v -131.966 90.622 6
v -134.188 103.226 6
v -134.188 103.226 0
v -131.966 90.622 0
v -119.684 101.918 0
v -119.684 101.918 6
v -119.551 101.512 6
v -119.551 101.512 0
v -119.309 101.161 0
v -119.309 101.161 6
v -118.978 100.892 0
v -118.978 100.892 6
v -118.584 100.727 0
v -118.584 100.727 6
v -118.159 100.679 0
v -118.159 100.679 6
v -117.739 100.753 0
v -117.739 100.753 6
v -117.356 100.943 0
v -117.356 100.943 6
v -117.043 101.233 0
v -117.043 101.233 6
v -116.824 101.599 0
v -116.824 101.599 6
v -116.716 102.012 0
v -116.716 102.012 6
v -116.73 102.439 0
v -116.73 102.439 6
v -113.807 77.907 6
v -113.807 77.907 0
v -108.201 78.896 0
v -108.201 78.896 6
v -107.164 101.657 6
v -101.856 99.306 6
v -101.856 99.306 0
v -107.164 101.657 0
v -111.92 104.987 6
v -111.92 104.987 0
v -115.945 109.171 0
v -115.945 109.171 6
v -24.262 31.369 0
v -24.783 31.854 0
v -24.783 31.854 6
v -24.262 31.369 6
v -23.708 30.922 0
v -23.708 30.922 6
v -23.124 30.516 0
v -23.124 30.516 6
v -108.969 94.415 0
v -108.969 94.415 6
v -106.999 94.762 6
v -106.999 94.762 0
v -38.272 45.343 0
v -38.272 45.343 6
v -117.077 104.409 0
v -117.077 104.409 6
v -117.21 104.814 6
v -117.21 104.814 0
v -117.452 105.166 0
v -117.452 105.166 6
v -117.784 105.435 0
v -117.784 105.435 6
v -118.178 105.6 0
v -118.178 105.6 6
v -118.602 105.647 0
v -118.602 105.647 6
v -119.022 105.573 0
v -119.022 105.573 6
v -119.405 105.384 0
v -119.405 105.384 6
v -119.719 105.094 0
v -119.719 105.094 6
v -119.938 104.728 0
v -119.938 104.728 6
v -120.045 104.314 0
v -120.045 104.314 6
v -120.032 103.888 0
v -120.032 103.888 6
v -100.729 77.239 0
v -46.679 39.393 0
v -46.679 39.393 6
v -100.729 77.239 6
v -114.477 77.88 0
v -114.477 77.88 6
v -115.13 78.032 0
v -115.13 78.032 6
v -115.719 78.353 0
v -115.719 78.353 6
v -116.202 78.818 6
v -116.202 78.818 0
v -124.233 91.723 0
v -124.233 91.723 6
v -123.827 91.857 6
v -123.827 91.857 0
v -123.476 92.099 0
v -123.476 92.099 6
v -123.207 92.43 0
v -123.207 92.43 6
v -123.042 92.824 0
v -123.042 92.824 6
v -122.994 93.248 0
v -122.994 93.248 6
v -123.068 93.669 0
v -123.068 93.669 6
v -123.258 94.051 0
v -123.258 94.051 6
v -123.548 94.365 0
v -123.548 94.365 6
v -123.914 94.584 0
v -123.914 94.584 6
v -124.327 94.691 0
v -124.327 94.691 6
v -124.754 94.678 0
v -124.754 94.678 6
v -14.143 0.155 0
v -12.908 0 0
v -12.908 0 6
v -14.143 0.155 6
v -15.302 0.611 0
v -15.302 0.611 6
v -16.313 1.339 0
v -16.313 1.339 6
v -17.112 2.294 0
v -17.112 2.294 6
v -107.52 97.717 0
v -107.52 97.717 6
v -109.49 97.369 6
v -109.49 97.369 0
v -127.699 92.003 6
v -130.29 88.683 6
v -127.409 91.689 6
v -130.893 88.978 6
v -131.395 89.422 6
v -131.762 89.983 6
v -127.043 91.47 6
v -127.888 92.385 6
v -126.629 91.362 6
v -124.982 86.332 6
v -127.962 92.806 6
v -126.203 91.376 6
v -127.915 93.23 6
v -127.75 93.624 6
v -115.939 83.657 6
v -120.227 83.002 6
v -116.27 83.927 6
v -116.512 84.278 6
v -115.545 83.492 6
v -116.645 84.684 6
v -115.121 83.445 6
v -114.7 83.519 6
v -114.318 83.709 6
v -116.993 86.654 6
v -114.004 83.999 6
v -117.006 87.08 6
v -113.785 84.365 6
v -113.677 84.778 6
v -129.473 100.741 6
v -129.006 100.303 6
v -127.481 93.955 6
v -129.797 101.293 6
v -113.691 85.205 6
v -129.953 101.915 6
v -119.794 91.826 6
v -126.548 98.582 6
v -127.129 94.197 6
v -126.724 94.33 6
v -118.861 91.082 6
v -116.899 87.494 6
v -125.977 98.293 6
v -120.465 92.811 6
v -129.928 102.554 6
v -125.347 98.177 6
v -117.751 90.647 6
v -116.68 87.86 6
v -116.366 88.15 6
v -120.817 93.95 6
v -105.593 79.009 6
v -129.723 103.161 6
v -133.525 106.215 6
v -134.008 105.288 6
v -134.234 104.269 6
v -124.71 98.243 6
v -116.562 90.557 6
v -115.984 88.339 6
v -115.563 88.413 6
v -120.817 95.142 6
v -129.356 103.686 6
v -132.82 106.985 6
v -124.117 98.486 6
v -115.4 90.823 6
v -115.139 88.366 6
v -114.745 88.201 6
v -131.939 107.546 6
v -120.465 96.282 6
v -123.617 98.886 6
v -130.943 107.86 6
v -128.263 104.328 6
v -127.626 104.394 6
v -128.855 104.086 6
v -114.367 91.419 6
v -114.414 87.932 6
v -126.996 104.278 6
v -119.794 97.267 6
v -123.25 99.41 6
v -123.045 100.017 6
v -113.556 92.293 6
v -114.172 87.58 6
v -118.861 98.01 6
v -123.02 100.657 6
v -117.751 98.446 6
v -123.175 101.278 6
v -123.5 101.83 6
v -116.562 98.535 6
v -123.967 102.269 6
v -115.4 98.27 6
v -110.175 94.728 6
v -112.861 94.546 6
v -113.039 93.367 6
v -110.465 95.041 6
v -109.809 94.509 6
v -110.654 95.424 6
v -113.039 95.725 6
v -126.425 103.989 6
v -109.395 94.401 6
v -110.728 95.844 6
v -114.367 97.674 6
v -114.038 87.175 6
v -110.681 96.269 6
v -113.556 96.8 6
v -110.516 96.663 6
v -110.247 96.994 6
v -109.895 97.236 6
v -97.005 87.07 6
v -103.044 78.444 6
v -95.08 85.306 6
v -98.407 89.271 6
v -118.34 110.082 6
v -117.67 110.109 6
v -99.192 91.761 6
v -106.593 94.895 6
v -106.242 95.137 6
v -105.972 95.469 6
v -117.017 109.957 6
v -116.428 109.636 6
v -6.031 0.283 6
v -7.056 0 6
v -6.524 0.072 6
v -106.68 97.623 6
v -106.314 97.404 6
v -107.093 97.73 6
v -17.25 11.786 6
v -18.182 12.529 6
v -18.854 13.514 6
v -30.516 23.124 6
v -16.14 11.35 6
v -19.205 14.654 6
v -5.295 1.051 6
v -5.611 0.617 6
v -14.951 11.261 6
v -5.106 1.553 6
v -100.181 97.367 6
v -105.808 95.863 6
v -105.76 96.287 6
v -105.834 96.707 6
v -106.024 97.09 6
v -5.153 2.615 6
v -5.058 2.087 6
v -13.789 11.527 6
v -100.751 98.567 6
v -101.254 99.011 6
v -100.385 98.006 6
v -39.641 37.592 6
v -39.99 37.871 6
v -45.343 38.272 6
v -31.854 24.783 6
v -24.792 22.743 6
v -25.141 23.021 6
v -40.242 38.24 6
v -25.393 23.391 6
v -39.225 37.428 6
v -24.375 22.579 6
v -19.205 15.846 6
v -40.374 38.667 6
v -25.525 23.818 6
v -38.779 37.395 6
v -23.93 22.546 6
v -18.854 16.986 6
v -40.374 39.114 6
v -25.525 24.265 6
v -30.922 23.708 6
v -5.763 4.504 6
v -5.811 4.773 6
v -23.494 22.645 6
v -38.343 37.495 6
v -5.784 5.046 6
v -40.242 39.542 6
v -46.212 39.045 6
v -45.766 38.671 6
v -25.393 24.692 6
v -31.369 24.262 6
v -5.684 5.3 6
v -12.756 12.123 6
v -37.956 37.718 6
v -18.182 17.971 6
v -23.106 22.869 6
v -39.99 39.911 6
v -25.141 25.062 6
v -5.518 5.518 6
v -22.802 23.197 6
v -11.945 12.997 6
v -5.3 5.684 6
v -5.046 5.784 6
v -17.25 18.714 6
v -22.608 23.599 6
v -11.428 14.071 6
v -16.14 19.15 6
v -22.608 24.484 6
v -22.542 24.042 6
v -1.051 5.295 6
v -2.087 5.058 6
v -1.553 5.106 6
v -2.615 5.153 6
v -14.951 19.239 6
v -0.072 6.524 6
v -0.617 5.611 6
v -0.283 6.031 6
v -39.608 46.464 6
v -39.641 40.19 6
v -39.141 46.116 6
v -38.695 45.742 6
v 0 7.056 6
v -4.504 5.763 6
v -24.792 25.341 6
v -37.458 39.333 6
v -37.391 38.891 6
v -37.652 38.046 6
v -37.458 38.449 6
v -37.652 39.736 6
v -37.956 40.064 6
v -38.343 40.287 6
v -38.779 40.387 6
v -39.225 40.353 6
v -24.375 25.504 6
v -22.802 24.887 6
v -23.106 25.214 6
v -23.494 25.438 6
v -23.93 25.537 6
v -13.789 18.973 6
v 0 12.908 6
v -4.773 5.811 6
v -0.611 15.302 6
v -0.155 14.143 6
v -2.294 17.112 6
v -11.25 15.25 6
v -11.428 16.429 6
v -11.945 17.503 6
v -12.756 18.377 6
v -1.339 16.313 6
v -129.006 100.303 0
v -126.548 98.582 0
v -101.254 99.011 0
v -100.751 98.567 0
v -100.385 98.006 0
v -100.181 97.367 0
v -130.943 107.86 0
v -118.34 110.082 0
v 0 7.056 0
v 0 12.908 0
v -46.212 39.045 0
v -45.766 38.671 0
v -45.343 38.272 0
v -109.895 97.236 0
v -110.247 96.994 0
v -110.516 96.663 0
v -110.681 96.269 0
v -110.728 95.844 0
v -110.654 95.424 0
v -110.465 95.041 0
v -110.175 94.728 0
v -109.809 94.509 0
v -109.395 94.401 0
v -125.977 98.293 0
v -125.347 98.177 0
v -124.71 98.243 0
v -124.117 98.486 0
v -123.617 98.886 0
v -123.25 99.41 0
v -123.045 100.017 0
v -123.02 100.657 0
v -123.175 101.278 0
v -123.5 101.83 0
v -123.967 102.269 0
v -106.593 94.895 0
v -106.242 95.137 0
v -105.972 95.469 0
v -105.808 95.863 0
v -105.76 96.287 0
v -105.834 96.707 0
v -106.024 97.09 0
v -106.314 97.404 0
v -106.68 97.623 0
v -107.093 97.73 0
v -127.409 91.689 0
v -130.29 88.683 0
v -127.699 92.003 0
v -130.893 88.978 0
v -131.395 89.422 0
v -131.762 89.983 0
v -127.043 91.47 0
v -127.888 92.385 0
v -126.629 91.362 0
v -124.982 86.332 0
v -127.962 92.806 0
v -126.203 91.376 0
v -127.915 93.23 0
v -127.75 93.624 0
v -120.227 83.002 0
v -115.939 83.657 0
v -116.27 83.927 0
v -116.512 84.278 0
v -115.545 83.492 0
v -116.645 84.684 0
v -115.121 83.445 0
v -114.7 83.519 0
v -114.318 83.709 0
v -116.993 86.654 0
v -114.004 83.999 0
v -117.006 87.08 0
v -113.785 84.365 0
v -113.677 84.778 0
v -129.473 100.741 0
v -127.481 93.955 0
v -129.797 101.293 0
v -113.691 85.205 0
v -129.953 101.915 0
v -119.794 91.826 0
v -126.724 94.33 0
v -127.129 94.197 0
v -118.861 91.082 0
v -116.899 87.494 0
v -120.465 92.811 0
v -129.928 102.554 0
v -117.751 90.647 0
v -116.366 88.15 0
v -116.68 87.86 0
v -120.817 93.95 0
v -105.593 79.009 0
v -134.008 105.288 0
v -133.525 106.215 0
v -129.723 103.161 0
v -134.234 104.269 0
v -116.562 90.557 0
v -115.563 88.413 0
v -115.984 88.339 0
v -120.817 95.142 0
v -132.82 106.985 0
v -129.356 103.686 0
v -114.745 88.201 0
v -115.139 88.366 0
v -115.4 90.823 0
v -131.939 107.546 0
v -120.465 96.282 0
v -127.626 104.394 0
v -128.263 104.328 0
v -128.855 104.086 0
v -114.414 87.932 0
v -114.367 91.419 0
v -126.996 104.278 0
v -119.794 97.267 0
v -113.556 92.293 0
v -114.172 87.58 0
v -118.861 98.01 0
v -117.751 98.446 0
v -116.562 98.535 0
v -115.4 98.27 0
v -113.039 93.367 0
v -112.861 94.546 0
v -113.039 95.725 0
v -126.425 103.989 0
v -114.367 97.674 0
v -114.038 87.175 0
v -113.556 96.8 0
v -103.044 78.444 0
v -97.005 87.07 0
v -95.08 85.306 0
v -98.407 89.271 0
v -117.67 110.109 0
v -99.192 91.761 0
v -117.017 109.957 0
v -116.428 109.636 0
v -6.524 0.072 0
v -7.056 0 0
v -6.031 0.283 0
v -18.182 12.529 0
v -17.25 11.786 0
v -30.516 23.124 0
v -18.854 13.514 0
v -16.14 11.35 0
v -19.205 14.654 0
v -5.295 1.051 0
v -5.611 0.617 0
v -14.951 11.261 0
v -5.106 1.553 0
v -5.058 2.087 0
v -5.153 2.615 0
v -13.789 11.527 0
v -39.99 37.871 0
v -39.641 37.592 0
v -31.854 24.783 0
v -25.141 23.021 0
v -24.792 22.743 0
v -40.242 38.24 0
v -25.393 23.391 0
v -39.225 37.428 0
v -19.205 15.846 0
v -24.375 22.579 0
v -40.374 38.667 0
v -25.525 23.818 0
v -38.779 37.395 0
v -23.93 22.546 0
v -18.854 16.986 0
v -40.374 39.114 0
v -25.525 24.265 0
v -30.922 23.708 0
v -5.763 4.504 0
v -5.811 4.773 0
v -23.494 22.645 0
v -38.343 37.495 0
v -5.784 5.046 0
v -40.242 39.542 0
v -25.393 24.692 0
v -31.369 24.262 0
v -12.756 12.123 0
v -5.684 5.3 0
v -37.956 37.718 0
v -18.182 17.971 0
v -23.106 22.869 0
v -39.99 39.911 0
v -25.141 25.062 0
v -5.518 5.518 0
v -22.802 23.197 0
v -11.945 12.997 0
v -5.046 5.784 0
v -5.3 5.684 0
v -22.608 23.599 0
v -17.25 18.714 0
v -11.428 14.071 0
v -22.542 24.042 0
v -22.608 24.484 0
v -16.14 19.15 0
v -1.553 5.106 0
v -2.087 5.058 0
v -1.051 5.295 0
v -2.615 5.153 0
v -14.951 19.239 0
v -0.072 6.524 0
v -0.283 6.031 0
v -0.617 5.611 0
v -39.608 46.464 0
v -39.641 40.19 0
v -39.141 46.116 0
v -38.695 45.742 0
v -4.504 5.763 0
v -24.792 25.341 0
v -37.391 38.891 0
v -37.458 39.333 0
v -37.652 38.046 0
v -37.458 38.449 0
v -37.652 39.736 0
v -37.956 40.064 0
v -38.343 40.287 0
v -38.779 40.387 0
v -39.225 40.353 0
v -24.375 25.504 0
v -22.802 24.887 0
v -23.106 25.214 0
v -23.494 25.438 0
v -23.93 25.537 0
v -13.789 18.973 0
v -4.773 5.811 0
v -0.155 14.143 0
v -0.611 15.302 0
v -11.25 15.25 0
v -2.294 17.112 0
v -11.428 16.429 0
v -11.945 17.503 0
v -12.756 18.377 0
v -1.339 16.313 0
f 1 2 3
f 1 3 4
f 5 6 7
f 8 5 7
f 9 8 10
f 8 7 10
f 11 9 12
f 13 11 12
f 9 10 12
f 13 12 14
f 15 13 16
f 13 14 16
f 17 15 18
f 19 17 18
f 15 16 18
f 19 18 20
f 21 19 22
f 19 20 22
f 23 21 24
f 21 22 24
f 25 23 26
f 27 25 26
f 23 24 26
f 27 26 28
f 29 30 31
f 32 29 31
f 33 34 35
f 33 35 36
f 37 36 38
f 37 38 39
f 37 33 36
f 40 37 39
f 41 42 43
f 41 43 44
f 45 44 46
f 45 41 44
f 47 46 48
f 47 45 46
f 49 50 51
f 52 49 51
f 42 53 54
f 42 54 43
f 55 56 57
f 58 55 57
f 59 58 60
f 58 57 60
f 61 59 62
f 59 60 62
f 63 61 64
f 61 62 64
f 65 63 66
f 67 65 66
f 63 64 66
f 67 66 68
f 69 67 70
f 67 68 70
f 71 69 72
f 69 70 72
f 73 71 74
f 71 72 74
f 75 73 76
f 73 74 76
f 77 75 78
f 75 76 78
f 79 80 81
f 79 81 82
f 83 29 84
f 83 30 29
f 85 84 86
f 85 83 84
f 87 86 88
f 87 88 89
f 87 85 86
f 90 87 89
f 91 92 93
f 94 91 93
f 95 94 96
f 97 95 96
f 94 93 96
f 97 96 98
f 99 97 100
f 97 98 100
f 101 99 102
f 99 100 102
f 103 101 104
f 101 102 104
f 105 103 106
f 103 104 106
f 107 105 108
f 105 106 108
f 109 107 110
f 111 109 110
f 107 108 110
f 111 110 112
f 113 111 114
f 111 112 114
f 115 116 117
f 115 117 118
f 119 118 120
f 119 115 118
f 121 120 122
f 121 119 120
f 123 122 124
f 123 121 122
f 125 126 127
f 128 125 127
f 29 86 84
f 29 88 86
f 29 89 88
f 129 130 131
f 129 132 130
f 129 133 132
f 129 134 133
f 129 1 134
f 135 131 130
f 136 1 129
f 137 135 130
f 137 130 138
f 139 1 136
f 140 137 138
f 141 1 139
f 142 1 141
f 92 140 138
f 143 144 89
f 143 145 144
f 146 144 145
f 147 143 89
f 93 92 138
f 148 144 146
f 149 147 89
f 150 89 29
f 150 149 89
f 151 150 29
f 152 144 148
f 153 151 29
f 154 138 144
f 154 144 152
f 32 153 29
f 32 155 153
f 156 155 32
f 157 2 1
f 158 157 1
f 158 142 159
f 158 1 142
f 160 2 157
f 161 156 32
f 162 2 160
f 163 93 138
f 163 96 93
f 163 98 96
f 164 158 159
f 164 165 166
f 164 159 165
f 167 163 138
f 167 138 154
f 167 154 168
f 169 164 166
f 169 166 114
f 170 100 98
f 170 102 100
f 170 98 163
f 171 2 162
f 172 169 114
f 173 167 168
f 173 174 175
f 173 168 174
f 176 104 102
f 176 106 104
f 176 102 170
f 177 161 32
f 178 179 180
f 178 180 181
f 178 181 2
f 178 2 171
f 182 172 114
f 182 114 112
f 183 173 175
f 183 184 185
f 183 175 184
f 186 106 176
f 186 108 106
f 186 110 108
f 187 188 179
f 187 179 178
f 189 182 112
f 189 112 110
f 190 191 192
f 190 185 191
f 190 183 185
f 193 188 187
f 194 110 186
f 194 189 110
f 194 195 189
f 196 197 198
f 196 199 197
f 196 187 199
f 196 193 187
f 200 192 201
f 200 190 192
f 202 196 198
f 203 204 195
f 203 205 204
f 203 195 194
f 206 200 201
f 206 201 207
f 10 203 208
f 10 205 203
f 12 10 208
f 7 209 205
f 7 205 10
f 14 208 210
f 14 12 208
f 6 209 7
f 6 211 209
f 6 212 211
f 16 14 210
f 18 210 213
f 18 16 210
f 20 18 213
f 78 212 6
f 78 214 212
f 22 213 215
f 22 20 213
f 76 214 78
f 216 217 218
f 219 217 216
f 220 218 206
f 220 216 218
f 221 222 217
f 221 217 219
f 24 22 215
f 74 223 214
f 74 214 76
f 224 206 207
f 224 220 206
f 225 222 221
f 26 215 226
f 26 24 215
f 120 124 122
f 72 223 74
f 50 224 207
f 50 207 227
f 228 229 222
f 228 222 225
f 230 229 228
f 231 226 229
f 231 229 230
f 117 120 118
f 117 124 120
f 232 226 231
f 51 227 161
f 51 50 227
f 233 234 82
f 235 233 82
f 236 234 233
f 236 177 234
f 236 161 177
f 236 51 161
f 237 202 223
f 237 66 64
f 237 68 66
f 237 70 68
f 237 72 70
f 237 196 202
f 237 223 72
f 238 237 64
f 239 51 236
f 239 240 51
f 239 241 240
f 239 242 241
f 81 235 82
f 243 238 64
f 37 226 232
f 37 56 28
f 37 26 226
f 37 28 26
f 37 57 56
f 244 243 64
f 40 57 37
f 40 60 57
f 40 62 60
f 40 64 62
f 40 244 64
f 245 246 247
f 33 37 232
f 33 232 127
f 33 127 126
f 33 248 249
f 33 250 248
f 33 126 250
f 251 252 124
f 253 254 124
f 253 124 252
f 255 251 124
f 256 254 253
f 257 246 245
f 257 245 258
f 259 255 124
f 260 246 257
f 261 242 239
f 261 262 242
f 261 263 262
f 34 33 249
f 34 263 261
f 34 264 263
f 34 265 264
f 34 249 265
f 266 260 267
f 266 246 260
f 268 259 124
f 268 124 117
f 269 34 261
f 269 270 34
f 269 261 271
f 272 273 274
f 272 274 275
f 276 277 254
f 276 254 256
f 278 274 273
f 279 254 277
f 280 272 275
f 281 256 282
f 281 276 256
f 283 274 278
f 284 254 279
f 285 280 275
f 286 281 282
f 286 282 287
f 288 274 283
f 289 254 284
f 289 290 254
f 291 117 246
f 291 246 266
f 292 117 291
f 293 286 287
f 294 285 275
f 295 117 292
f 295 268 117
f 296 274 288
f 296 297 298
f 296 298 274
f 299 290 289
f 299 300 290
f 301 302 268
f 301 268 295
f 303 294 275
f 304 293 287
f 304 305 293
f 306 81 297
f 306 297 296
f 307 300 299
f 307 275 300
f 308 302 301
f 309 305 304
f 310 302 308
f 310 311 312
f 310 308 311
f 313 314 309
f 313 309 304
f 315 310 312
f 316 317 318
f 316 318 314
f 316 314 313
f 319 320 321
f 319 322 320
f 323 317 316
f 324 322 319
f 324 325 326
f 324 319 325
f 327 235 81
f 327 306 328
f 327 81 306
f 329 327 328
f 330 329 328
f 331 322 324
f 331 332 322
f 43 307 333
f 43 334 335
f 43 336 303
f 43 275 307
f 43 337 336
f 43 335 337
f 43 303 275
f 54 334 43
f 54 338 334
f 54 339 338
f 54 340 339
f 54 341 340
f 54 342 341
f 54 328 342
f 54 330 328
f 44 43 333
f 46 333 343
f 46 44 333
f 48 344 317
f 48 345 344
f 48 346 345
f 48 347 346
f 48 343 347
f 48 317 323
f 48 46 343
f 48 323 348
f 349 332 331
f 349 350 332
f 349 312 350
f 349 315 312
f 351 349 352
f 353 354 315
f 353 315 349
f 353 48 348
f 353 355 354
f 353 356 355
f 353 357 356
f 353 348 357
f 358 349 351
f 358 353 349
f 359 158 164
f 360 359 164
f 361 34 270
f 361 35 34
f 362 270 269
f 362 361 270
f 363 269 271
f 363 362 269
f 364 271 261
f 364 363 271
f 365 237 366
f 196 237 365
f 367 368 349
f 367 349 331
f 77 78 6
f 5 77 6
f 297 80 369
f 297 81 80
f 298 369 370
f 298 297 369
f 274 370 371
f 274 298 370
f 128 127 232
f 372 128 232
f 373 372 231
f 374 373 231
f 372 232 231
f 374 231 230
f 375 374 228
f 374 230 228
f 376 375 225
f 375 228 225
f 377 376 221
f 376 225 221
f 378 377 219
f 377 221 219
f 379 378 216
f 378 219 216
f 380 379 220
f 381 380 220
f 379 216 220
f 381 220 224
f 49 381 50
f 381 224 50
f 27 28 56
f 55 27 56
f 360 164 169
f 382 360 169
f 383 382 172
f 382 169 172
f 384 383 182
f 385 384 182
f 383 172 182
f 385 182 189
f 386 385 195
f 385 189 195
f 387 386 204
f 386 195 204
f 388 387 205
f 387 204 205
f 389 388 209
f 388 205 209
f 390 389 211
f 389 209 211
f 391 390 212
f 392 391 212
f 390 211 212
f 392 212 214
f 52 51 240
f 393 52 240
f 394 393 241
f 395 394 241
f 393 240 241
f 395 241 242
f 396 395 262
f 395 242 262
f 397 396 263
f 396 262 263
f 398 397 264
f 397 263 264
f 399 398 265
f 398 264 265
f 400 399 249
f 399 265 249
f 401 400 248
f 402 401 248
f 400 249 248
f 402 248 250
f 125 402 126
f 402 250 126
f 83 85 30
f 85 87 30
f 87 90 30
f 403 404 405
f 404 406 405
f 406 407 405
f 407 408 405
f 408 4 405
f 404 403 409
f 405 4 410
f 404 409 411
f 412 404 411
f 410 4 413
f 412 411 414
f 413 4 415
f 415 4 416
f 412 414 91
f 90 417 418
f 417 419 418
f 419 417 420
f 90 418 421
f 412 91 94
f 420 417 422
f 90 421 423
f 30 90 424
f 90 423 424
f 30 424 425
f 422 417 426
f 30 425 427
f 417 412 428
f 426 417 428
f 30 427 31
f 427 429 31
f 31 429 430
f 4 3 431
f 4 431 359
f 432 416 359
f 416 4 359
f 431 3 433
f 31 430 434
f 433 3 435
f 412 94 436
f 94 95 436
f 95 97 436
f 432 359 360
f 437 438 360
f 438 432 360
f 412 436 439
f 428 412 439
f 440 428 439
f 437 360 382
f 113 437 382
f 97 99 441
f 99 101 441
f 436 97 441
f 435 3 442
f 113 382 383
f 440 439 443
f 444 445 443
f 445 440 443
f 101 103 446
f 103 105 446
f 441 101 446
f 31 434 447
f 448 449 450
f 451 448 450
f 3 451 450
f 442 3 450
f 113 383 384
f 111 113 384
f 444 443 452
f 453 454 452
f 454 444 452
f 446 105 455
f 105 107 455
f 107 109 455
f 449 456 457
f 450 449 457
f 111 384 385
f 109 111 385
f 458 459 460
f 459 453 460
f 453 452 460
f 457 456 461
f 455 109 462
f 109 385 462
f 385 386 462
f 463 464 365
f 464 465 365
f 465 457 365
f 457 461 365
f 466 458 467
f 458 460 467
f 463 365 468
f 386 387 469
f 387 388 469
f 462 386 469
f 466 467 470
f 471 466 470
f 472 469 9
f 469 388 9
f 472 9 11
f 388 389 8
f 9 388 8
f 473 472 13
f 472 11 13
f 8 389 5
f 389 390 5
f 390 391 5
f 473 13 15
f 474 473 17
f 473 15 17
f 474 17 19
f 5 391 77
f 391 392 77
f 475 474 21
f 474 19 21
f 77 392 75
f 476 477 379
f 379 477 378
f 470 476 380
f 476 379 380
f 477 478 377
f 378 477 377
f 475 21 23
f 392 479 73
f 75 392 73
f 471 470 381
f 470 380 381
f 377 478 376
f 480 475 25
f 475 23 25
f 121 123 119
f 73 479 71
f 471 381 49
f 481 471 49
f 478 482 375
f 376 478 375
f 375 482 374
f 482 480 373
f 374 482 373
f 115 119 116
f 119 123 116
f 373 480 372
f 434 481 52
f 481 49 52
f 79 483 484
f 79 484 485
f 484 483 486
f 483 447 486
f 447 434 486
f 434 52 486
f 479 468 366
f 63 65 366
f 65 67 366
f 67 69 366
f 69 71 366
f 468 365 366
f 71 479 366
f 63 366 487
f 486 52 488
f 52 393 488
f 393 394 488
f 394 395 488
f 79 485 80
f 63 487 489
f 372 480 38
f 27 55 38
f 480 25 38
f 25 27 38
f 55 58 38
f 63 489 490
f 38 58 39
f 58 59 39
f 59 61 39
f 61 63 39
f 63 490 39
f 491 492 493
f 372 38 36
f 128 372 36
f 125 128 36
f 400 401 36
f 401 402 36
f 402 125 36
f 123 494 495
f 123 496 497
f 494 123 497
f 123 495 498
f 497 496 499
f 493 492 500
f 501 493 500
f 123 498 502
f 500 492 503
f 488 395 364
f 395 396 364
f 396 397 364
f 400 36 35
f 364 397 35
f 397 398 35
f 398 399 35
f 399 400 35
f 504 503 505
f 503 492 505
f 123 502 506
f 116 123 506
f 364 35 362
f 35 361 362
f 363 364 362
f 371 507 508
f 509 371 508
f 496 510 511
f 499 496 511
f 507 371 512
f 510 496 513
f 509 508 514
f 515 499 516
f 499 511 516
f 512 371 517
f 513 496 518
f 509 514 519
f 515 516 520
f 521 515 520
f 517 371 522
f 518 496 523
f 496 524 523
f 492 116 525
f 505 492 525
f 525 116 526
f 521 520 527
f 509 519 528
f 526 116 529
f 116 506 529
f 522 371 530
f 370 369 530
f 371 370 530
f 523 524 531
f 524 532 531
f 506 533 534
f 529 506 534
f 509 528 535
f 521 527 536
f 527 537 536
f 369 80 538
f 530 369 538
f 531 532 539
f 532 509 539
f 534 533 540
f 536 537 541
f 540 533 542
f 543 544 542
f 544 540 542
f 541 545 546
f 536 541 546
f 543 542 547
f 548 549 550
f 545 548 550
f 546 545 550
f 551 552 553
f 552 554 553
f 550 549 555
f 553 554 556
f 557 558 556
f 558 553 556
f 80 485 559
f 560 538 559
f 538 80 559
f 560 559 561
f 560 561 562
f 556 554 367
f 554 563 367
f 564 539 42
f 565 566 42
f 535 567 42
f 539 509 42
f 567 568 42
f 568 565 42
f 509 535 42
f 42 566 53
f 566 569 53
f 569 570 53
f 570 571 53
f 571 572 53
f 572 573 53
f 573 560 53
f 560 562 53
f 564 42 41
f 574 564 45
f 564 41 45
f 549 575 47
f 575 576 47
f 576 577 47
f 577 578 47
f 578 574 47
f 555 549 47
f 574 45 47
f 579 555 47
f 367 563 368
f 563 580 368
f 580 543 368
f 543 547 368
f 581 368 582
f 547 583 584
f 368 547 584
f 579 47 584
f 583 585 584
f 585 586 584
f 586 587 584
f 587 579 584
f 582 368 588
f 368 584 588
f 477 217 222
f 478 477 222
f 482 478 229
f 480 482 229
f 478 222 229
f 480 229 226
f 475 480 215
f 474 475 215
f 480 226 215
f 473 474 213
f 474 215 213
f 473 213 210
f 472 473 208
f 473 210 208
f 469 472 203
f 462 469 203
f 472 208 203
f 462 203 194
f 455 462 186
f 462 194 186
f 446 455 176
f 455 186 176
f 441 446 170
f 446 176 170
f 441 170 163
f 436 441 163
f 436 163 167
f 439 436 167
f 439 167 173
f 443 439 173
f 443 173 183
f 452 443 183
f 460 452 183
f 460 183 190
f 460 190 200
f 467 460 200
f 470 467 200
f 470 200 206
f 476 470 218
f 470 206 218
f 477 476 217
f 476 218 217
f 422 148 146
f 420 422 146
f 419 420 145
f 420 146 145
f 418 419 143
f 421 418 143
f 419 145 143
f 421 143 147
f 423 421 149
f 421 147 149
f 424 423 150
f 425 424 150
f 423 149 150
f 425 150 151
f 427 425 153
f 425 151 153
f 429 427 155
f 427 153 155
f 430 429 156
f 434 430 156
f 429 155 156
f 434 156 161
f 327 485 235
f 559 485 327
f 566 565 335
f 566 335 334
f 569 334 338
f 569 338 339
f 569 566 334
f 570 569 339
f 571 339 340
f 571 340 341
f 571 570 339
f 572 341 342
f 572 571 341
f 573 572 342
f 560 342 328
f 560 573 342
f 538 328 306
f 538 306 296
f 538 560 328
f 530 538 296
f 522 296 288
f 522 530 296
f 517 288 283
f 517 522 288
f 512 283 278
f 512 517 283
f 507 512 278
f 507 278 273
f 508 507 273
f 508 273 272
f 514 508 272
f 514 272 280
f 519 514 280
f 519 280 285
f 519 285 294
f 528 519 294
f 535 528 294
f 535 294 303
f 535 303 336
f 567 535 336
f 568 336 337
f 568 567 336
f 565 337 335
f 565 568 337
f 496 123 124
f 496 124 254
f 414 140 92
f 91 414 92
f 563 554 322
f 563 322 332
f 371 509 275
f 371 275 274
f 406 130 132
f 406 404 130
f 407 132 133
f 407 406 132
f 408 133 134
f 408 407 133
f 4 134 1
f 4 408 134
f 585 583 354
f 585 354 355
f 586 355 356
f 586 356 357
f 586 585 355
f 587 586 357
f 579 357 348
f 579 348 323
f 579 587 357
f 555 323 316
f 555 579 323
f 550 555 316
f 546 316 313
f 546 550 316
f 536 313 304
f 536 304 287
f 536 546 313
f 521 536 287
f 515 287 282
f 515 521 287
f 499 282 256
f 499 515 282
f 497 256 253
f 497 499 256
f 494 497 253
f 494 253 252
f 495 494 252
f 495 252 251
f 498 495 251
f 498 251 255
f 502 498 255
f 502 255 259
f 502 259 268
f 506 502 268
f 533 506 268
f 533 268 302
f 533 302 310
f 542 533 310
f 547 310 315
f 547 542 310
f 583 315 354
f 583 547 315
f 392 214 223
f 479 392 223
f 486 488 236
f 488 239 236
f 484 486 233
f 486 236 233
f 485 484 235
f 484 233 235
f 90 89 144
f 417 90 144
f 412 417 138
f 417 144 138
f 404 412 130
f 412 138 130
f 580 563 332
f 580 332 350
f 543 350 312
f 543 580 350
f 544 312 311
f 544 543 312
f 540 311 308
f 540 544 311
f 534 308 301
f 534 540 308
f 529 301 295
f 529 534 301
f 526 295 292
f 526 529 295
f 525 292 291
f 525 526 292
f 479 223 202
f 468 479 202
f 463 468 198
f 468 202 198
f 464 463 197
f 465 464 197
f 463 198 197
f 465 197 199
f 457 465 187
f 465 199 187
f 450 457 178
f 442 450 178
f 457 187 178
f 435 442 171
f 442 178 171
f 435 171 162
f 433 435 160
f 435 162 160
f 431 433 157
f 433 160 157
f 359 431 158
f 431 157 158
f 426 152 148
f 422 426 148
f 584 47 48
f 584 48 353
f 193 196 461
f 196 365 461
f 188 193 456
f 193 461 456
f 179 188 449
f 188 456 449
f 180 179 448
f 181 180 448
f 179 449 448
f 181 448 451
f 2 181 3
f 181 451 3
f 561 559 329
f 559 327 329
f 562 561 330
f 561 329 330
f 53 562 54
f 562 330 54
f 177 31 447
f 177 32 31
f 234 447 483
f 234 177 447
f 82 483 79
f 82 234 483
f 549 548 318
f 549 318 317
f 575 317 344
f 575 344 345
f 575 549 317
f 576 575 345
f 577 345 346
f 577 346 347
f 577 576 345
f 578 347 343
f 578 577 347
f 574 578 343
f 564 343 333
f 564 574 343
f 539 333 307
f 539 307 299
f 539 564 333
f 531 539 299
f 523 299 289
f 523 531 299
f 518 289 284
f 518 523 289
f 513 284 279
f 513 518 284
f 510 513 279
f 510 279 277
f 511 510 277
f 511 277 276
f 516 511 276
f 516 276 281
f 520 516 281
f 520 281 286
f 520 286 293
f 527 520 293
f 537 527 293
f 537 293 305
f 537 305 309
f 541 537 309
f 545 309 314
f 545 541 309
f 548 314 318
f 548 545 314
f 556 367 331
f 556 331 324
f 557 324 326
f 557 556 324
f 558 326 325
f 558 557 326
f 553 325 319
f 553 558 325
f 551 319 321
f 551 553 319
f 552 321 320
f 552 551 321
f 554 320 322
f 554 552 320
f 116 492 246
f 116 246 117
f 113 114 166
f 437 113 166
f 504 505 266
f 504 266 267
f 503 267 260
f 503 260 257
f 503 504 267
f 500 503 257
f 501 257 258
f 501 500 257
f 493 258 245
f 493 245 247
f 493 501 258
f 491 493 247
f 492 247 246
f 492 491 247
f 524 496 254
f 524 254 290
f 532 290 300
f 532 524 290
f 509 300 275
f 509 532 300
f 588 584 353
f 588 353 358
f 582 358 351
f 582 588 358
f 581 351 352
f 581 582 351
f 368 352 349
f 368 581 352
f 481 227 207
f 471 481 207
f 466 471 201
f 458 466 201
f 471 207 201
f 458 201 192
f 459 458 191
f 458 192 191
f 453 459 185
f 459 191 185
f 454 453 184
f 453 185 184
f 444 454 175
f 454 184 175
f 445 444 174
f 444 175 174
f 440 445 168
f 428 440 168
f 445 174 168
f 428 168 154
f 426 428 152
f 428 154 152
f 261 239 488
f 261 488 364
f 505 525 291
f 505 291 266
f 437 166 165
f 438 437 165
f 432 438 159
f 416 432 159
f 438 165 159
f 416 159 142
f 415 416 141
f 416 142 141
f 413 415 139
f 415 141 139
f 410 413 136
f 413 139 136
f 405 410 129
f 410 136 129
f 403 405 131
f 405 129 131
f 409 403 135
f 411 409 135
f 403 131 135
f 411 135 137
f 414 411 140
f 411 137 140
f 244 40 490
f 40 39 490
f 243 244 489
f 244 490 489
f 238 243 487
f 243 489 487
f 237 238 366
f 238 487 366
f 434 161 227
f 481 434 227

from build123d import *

# Parameters (mm, degrees)
CROQUIS1_R              = 1.5
CROQUIS1_R_2            = 4
SALIENTE_EXTRUIR1_DEPTH = 6
CROQUIS4_R              = 4
SALIENTE_EXTRUIR3_DEPTH = 6
CORTAR_EXTRUIR1_DEPTH   = 6
REDONDEO3_R             = 4
CORTAR_EXTRUIR2_DEPTH   = 6
REDONDEO4_R             = 2.5
REDONDEO6_R             = 10


with BuildPart() as part:
    # Croquis1 → Saliente-Extruir1 (new body)
    with BuildSketch(Plane.XY):
        with BuildLine():
            Line((-17.112213819, 2.294275414), (-30.516043414, 23.123582692))
            ThreePointArc((-30.516043414, 23.123582692), (-31.14080226, 23.989156666), (-31.854269143, 24.783201331))
            Line((-31.854269143, 24.783201331), (-45.961940777, 38.890872965))
            Line((-45.961940777, 38.890872965), (-104.121735922, 79.614799946))
            Line((-104.121735922, 79.614799946), (-98.473110707, 87.681872787))
            Line((-98.473110707, 87.681872787), (-38.890872965, 45.961940777))
            Line((-38.890872965, 45.961940777), (-24.783201331, 31.854269143))
            ThreePointArc((-24.783201331, 31.854269143), (-23.989156666, 31.14080226), (-23.123582692, 30.516043414))
            Line((-23.123582692, 30.516043414), (-2.294275414, 17.112213819))
            ThreePointArc((-2.294275414, 17.112213819), (-0.610887166, 15.302496804), (0, 12.907567049))
            Line((0, 12.907567049), (0, 7.055686841))
            ThreePointArc((0, 7.055686841), (-0.823113423, 5.438609853), (-2.614937985, 5.15257064))
            Line((-2.614937985, 5.15257064), (-4.503911831, 5.762938925))
            ThreePointArc((-4.503911831, 5.762938925), (-5.518487605, 5.518487605), (-5.762938925, 4.503911831))
            Line((-5.762938925, 4.503911831), (-5.15257064, 2.614937985))
            ThreePointArc((-5.15257064, 2.614937985), (-5.438609853, 0.823113423), (-7.055686841, 0))
            Line((-7.055686841, 0), (-12.907567049, 0))
            ThreePointArc((-12.907567049, 0), (-15.302496804, 0.610887166), (-17.112213819, 2.294275414))
        make_face()
        with Locations((-38.890872965, 38.890872965)):
            Circle(CROQUIS1_R, mode=Mode.SUBTRACT)
        with Locations((-24.04163056, 24.04163056)):
            Circle(CROQUIS1_R, mode=Mode.SUBTRACT)
        with Locations((-15.25, 15.25)):
            Circle(CROQUIS1_R_2, mode=Mode.SUBTRACT)
    extrude(amount=SALIENTE_EXTRUIR1_DEPTH)

    # Croquis4 → Saliente-Extruir3 (add)
    with BuildSketch(Plane.XY.offset(6)):
        Polygon((-98.473110707, 87.681872787), (-100.447042684, 98.87659732), (-116.83008357, 110.348126047), (-134.88265713, 107.164970257), (-131.69950134, 89.112396696), (-115.316460454, 77.640867969), (-104.121735922, 79.614799946), align=None)
        with Locations((-116.861312156, 94.546288657)):
            Circle(CROQUIS4_R, mode=Mode.SUBTRACT)
    extrude(amount=-SALIENTE_EXTRUIR3_DEPTH)

    # Croquis5 → Cortar-Extruir1 (cut)
    with BuildSketch(Plane.XY.offset(6)):
        with BuildLine():
            Line((-129.005623724, 100.303084339), (-126.548167592, 98.58235503))
            ThreePointArc((-126.548167592, 98.58235503), (-123.41452851, 99.134900148), (-123.967073628, 102.26853923))
            Line((-123.967073628, 102.26853923), (-126.424529761, 103.989268539))
            ThreePointArc((-126.424529761, 103.989268539), (-129.558168842, 103.436723421), (-129.005623724, 100.303084339))
        make_face()
        with BuildLine():
            Line((-116.992750408, 86.653556305), (-116.645454053, 84.683940799))
            ThreePointArc((-116.645454053, 84.683940799), (-114.907770157, 83.467201436), (-113.691030794, 85.204885332))
            Line((-113.691030794, 85.204885332), (-114.038327149, 87.174500838))
            ThreePointArc((-114.038327149, 87.174500838), (-115.776011045, 88.391240201), (-116.992750408, 86.653556305))
        make_face()
        with BuildLine():
            Line((-108.968579803, 94.414850405), (-106.998964297, 94.76214676))
            ThreePointArc((-106.998964297, 94.76214676), (-105.782224934, 96.499830656), (-107.51990883, 97.716570019))
            Line((-107.51990883, 97.716570019), (-109.489524336, 97.369273664))
            ThreePointArc((-109.489524336, 97.369273664), (-110.706263699, 95.631589768), (-108.968579803, 94.414850405))
        make_face()
        with BuildLine():
            Line((-124.754044508, 94.67772691), (-126.723660014, 94.330430555))
            ThreePointArc((-126.723660014, 94.330430555), (-127.940399377, 92.592746659), (-126.202715481, 91.376007296))
            Line((-126.202715481, 91.376007296), (-124.233099975, 91.723303651))
            ThreePointArc((-124.233099975, 91.723303651), (-123.016360612, 93.460987547), (-124.754044508, 94.67772691))
        make_face()
        with BuildLine():
            Line((-116.729873903, 102.43902101), (-117.077170259, 104.408636516))
            ThreePointArc((-117.077170259, 104.408636516), (-118.814854155, 105.625375879), (-120.031593518, 103.887691983))
            Line((-120.031593518, 103.887691983), (-119.684297162, 101.918076477))
            ThreePointArc((-119.684297162, 101.918076477), (-117.946613266, 100.701337114), (-116.729873903, 102.43902101))
        make_face()
    extrude(amount=-CORTAR_EXTRUIR1_DEPTH, mode=Mode.SUBTRACT)

    # Redondeo3
    redondeo3_edges = [part.edges().sort_by_distance(p)[0] for p in [
        (-134.88265713, 107.164970257, 3),
    ]]
    fillet(redondeo3_edges, radius=REDONDEO3_R)

    # Croquis7 → Cortar-Extruir2 (cut)
    with BuildSketch(Plane.XY.offset(6)):
        with BuildLine():
            Line((-131.69950134, 89.112396696), (-115.316460454, 77.640867969))
            ThreePointArc((-115.316460454, 77.640867969), (-122.523879314, 84.782075048), (-131.69950134, 89.112396696))
        make_face()
        with BuildLine():
            Line((-116.83008357, 110.348126047), (-100.447042684, 98.87659732))
            ThreePointArc((-100.447042684, 98.87659732), (-109.62266471, 103.206918969), (-116.83008357, 110.348126047))
        make_face()
    extrude(amount=-CORTAR_EXTRUIR2_DEPTH, mode=Mode.SUBTRACT)

    # Redondeo4
    redondeo4_edges = [part.edges().sort_by_distance(p)[0] for p in [
        (-115.316460454, 77.640867969, 3),
        (-131.69950134, 89.112396696, 3),
        (-116.83008357, 110.348126047, 3),
        (-100.447042684, 98.87659732, 3),
    ]]
    fillet(redondeo4_edges, radius=REDONDEO4_R)

    # Redondeo6
    redondeo6_edges = [part.edges().sort_by_distance(p)[0] for p in [
        (-38.890872965, 45.961940777, 3),
        (-45.961940777, 38.890872965, 3),
        (-104.121735922, 79.614799946, 3),
        (-98.473110707, 87.681872787, 3),
    ]]
    fillet(redondeo6_edges, radius=REDONDEO6_R)


solid = part.part
